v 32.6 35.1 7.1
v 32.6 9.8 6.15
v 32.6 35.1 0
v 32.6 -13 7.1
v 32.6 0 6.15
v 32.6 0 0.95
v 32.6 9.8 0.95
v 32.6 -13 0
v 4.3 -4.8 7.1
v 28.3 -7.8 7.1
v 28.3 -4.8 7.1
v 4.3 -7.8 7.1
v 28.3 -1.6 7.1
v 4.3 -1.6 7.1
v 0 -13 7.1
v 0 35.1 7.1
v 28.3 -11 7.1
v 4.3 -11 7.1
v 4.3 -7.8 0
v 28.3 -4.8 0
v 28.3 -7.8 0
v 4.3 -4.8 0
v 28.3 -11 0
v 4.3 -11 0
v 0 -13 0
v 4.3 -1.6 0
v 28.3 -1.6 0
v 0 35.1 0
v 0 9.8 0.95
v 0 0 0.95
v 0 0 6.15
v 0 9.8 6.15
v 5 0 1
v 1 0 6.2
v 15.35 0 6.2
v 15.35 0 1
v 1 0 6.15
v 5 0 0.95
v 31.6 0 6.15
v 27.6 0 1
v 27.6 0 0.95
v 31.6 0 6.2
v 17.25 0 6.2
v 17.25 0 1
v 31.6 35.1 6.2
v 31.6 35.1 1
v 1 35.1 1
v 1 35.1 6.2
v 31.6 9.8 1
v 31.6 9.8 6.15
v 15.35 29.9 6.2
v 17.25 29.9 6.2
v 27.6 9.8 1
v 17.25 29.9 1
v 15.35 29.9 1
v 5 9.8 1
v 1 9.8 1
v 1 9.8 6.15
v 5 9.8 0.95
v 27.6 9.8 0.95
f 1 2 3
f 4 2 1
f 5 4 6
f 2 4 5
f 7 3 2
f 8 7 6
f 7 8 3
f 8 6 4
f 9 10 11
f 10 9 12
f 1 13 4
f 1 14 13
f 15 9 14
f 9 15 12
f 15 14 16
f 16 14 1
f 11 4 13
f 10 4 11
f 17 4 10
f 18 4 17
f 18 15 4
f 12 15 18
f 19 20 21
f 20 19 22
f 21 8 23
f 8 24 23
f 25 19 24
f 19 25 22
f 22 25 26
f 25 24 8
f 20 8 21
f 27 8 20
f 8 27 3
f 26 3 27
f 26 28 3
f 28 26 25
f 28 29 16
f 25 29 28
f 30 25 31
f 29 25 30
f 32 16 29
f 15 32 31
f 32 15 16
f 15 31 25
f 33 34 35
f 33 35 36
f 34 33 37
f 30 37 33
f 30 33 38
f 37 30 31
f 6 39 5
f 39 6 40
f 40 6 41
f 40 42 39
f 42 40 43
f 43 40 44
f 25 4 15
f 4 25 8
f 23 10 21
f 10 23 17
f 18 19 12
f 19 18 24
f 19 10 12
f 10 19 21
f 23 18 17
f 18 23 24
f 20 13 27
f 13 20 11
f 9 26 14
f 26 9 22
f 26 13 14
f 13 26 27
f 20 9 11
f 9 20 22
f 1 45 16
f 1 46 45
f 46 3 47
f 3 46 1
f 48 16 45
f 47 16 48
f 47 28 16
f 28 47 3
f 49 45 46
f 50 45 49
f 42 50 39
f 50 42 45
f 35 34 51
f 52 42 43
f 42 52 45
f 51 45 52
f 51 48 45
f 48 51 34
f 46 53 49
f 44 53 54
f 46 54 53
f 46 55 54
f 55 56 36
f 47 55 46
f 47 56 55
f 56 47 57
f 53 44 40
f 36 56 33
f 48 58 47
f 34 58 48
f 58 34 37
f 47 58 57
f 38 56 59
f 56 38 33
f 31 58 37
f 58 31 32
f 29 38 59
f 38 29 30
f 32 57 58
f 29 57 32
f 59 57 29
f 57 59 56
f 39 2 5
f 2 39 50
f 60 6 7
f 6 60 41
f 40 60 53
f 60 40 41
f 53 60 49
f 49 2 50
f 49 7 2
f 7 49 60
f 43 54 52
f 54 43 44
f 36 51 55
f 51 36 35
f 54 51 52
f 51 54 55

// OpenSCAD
// connector_female.scad
// Female receiver part for the snap buckle connector.
// This part has:
// - a bag-style strap holder base
// - a rectangular receiver body
// - an internal cutout where the male part slides in
// - side openings for the male locking heads
// - a center guide rail that matches the slot in the male part

$fn = 60;


// ------------------------------------------------------------
// Main receiver body
// ------------------------------------------------------------

// Outer size of the female receiver body.
main_width = 32.6;     // X direction
main_height = 35.1;    // Y direction
main_depth = 7.1;      // Z direction


// ------------------------------------------------------------
// Internal receiver cutout
// ------------------------------------------------------------

// This cutout creates the internal space where the male part slides in.
cut_width = 30.6;      // X direction
cut_height = 35.1;     // Y direction
cut_depth = 5.1;       // Z direction


// ------------------------------------------------------------
// Center guide rail
// ------------------------------------------------------------

// This rail keeps the male connector moving straight.
// It matches the open slot in the male center guide.
line_width = 1.9;      // X direction
line_height = 29.9;    // Y direction
line_depth = 7.1;      // Z direction


// ------------------------------------------------------------
// Bag-style strap holder base
// ------------------------------------------------------------

// Base block behind the receiver body.
base_width = 32.6;     // X direction
base_height = 13;      // Y direction
base_depth = 7.1;      // Z direction

// Two strap slots are cut through the base.
strap_slot_width = 24;
strap_slot_height = 3.2;

// Solid material between the two strap slots.
strap_bar_height = 3;


// ------------------------------------------------------------
// Side locking openings
// ------------------------------------------------------------

// These holes allow the male locking heads to snap into place
// and also make it possible to press/release the connector.
side_hole_width = 5;       // X direction, how far the hole cuts into the side
side_hole_height = 9.8;   // Y direction
side_hole_depth = 5.2;     // Z direction


// ------------------------------------------------------------
// Final model
// ------------------------------------------------------------

union() {

    // --------------------------------------------------------
    // Strap holder base
    // --------------------------------------------------------

    difference() {

        // Solid base block behind the receiver
        translate([0, -base_height, 0])
            cube([
                base_width,
                base_height,
                base_depth
            ]);


        // First strap slot
        translate([
            (base_width - strap_slot_width) / 2,
            -base_height + 2,
            -0.1
        ])
            cube([
                strap_slot_width,
                strap_slot_height,
                base_depth + 0.2
            ]);


        // Second strap slot
        translate([
            (base_width - strap_slot_width) / 2,
            -base_height + 2 + strap_slot_height + strap_bar_height,
            -0.1
        ])
            cube([
                strap_slot_width,
                strap_slot_height,
                base_depth + 0.2
            ]);
    }


    // --------------------------------------------------------
    // Female receiver body
    // --------------------------------------------------------

    difference() {

        // Outer receiver block
        cube([
            main_width,
            main_height,
            main_depth
        ]);


        // Main internal cutout
        // This creates the tunnel for the male connector.
        translate([
            (main_width - cut_width) / 2,
            (main_height - cut_height) / 2,
            (main_depth - cut_depth) / 2
        ])
            cube([
                cut_width,
                cut_height,
                cut_depth + 0.1
            ]);


        // Left side locking opening
        // Starts at the entrance side of the receiver.
        translate([
            -0.1,
            0,
            (main_depth - side_hole_depth) / 2
        ])
            cube([
                side_hole_width + 0.1,
                side_hole_height,
                side_hole_depth
            ]);


        // Right side locking opening
        // Starts at the entrance side of the receiver.
        translate([
            main_width - side_hole_width,
            0,
            (main_depth - side_hole_depth) / 2
        ])
            cube([
                side_hole_width + 0.1,
                side_hole_height,
                side_hole_depth
            ]);
    }


    // --------------------------------------------------------
    // Center guide rail
    // --------------------------------------------------------

    // This rail fits into the slot of the male connector.
    translate([
        (main_width - line_width) / 2,
        0,
        0
    ])
        cube([
            line_width,
            line_height,
            line_depth
        ]);
}
